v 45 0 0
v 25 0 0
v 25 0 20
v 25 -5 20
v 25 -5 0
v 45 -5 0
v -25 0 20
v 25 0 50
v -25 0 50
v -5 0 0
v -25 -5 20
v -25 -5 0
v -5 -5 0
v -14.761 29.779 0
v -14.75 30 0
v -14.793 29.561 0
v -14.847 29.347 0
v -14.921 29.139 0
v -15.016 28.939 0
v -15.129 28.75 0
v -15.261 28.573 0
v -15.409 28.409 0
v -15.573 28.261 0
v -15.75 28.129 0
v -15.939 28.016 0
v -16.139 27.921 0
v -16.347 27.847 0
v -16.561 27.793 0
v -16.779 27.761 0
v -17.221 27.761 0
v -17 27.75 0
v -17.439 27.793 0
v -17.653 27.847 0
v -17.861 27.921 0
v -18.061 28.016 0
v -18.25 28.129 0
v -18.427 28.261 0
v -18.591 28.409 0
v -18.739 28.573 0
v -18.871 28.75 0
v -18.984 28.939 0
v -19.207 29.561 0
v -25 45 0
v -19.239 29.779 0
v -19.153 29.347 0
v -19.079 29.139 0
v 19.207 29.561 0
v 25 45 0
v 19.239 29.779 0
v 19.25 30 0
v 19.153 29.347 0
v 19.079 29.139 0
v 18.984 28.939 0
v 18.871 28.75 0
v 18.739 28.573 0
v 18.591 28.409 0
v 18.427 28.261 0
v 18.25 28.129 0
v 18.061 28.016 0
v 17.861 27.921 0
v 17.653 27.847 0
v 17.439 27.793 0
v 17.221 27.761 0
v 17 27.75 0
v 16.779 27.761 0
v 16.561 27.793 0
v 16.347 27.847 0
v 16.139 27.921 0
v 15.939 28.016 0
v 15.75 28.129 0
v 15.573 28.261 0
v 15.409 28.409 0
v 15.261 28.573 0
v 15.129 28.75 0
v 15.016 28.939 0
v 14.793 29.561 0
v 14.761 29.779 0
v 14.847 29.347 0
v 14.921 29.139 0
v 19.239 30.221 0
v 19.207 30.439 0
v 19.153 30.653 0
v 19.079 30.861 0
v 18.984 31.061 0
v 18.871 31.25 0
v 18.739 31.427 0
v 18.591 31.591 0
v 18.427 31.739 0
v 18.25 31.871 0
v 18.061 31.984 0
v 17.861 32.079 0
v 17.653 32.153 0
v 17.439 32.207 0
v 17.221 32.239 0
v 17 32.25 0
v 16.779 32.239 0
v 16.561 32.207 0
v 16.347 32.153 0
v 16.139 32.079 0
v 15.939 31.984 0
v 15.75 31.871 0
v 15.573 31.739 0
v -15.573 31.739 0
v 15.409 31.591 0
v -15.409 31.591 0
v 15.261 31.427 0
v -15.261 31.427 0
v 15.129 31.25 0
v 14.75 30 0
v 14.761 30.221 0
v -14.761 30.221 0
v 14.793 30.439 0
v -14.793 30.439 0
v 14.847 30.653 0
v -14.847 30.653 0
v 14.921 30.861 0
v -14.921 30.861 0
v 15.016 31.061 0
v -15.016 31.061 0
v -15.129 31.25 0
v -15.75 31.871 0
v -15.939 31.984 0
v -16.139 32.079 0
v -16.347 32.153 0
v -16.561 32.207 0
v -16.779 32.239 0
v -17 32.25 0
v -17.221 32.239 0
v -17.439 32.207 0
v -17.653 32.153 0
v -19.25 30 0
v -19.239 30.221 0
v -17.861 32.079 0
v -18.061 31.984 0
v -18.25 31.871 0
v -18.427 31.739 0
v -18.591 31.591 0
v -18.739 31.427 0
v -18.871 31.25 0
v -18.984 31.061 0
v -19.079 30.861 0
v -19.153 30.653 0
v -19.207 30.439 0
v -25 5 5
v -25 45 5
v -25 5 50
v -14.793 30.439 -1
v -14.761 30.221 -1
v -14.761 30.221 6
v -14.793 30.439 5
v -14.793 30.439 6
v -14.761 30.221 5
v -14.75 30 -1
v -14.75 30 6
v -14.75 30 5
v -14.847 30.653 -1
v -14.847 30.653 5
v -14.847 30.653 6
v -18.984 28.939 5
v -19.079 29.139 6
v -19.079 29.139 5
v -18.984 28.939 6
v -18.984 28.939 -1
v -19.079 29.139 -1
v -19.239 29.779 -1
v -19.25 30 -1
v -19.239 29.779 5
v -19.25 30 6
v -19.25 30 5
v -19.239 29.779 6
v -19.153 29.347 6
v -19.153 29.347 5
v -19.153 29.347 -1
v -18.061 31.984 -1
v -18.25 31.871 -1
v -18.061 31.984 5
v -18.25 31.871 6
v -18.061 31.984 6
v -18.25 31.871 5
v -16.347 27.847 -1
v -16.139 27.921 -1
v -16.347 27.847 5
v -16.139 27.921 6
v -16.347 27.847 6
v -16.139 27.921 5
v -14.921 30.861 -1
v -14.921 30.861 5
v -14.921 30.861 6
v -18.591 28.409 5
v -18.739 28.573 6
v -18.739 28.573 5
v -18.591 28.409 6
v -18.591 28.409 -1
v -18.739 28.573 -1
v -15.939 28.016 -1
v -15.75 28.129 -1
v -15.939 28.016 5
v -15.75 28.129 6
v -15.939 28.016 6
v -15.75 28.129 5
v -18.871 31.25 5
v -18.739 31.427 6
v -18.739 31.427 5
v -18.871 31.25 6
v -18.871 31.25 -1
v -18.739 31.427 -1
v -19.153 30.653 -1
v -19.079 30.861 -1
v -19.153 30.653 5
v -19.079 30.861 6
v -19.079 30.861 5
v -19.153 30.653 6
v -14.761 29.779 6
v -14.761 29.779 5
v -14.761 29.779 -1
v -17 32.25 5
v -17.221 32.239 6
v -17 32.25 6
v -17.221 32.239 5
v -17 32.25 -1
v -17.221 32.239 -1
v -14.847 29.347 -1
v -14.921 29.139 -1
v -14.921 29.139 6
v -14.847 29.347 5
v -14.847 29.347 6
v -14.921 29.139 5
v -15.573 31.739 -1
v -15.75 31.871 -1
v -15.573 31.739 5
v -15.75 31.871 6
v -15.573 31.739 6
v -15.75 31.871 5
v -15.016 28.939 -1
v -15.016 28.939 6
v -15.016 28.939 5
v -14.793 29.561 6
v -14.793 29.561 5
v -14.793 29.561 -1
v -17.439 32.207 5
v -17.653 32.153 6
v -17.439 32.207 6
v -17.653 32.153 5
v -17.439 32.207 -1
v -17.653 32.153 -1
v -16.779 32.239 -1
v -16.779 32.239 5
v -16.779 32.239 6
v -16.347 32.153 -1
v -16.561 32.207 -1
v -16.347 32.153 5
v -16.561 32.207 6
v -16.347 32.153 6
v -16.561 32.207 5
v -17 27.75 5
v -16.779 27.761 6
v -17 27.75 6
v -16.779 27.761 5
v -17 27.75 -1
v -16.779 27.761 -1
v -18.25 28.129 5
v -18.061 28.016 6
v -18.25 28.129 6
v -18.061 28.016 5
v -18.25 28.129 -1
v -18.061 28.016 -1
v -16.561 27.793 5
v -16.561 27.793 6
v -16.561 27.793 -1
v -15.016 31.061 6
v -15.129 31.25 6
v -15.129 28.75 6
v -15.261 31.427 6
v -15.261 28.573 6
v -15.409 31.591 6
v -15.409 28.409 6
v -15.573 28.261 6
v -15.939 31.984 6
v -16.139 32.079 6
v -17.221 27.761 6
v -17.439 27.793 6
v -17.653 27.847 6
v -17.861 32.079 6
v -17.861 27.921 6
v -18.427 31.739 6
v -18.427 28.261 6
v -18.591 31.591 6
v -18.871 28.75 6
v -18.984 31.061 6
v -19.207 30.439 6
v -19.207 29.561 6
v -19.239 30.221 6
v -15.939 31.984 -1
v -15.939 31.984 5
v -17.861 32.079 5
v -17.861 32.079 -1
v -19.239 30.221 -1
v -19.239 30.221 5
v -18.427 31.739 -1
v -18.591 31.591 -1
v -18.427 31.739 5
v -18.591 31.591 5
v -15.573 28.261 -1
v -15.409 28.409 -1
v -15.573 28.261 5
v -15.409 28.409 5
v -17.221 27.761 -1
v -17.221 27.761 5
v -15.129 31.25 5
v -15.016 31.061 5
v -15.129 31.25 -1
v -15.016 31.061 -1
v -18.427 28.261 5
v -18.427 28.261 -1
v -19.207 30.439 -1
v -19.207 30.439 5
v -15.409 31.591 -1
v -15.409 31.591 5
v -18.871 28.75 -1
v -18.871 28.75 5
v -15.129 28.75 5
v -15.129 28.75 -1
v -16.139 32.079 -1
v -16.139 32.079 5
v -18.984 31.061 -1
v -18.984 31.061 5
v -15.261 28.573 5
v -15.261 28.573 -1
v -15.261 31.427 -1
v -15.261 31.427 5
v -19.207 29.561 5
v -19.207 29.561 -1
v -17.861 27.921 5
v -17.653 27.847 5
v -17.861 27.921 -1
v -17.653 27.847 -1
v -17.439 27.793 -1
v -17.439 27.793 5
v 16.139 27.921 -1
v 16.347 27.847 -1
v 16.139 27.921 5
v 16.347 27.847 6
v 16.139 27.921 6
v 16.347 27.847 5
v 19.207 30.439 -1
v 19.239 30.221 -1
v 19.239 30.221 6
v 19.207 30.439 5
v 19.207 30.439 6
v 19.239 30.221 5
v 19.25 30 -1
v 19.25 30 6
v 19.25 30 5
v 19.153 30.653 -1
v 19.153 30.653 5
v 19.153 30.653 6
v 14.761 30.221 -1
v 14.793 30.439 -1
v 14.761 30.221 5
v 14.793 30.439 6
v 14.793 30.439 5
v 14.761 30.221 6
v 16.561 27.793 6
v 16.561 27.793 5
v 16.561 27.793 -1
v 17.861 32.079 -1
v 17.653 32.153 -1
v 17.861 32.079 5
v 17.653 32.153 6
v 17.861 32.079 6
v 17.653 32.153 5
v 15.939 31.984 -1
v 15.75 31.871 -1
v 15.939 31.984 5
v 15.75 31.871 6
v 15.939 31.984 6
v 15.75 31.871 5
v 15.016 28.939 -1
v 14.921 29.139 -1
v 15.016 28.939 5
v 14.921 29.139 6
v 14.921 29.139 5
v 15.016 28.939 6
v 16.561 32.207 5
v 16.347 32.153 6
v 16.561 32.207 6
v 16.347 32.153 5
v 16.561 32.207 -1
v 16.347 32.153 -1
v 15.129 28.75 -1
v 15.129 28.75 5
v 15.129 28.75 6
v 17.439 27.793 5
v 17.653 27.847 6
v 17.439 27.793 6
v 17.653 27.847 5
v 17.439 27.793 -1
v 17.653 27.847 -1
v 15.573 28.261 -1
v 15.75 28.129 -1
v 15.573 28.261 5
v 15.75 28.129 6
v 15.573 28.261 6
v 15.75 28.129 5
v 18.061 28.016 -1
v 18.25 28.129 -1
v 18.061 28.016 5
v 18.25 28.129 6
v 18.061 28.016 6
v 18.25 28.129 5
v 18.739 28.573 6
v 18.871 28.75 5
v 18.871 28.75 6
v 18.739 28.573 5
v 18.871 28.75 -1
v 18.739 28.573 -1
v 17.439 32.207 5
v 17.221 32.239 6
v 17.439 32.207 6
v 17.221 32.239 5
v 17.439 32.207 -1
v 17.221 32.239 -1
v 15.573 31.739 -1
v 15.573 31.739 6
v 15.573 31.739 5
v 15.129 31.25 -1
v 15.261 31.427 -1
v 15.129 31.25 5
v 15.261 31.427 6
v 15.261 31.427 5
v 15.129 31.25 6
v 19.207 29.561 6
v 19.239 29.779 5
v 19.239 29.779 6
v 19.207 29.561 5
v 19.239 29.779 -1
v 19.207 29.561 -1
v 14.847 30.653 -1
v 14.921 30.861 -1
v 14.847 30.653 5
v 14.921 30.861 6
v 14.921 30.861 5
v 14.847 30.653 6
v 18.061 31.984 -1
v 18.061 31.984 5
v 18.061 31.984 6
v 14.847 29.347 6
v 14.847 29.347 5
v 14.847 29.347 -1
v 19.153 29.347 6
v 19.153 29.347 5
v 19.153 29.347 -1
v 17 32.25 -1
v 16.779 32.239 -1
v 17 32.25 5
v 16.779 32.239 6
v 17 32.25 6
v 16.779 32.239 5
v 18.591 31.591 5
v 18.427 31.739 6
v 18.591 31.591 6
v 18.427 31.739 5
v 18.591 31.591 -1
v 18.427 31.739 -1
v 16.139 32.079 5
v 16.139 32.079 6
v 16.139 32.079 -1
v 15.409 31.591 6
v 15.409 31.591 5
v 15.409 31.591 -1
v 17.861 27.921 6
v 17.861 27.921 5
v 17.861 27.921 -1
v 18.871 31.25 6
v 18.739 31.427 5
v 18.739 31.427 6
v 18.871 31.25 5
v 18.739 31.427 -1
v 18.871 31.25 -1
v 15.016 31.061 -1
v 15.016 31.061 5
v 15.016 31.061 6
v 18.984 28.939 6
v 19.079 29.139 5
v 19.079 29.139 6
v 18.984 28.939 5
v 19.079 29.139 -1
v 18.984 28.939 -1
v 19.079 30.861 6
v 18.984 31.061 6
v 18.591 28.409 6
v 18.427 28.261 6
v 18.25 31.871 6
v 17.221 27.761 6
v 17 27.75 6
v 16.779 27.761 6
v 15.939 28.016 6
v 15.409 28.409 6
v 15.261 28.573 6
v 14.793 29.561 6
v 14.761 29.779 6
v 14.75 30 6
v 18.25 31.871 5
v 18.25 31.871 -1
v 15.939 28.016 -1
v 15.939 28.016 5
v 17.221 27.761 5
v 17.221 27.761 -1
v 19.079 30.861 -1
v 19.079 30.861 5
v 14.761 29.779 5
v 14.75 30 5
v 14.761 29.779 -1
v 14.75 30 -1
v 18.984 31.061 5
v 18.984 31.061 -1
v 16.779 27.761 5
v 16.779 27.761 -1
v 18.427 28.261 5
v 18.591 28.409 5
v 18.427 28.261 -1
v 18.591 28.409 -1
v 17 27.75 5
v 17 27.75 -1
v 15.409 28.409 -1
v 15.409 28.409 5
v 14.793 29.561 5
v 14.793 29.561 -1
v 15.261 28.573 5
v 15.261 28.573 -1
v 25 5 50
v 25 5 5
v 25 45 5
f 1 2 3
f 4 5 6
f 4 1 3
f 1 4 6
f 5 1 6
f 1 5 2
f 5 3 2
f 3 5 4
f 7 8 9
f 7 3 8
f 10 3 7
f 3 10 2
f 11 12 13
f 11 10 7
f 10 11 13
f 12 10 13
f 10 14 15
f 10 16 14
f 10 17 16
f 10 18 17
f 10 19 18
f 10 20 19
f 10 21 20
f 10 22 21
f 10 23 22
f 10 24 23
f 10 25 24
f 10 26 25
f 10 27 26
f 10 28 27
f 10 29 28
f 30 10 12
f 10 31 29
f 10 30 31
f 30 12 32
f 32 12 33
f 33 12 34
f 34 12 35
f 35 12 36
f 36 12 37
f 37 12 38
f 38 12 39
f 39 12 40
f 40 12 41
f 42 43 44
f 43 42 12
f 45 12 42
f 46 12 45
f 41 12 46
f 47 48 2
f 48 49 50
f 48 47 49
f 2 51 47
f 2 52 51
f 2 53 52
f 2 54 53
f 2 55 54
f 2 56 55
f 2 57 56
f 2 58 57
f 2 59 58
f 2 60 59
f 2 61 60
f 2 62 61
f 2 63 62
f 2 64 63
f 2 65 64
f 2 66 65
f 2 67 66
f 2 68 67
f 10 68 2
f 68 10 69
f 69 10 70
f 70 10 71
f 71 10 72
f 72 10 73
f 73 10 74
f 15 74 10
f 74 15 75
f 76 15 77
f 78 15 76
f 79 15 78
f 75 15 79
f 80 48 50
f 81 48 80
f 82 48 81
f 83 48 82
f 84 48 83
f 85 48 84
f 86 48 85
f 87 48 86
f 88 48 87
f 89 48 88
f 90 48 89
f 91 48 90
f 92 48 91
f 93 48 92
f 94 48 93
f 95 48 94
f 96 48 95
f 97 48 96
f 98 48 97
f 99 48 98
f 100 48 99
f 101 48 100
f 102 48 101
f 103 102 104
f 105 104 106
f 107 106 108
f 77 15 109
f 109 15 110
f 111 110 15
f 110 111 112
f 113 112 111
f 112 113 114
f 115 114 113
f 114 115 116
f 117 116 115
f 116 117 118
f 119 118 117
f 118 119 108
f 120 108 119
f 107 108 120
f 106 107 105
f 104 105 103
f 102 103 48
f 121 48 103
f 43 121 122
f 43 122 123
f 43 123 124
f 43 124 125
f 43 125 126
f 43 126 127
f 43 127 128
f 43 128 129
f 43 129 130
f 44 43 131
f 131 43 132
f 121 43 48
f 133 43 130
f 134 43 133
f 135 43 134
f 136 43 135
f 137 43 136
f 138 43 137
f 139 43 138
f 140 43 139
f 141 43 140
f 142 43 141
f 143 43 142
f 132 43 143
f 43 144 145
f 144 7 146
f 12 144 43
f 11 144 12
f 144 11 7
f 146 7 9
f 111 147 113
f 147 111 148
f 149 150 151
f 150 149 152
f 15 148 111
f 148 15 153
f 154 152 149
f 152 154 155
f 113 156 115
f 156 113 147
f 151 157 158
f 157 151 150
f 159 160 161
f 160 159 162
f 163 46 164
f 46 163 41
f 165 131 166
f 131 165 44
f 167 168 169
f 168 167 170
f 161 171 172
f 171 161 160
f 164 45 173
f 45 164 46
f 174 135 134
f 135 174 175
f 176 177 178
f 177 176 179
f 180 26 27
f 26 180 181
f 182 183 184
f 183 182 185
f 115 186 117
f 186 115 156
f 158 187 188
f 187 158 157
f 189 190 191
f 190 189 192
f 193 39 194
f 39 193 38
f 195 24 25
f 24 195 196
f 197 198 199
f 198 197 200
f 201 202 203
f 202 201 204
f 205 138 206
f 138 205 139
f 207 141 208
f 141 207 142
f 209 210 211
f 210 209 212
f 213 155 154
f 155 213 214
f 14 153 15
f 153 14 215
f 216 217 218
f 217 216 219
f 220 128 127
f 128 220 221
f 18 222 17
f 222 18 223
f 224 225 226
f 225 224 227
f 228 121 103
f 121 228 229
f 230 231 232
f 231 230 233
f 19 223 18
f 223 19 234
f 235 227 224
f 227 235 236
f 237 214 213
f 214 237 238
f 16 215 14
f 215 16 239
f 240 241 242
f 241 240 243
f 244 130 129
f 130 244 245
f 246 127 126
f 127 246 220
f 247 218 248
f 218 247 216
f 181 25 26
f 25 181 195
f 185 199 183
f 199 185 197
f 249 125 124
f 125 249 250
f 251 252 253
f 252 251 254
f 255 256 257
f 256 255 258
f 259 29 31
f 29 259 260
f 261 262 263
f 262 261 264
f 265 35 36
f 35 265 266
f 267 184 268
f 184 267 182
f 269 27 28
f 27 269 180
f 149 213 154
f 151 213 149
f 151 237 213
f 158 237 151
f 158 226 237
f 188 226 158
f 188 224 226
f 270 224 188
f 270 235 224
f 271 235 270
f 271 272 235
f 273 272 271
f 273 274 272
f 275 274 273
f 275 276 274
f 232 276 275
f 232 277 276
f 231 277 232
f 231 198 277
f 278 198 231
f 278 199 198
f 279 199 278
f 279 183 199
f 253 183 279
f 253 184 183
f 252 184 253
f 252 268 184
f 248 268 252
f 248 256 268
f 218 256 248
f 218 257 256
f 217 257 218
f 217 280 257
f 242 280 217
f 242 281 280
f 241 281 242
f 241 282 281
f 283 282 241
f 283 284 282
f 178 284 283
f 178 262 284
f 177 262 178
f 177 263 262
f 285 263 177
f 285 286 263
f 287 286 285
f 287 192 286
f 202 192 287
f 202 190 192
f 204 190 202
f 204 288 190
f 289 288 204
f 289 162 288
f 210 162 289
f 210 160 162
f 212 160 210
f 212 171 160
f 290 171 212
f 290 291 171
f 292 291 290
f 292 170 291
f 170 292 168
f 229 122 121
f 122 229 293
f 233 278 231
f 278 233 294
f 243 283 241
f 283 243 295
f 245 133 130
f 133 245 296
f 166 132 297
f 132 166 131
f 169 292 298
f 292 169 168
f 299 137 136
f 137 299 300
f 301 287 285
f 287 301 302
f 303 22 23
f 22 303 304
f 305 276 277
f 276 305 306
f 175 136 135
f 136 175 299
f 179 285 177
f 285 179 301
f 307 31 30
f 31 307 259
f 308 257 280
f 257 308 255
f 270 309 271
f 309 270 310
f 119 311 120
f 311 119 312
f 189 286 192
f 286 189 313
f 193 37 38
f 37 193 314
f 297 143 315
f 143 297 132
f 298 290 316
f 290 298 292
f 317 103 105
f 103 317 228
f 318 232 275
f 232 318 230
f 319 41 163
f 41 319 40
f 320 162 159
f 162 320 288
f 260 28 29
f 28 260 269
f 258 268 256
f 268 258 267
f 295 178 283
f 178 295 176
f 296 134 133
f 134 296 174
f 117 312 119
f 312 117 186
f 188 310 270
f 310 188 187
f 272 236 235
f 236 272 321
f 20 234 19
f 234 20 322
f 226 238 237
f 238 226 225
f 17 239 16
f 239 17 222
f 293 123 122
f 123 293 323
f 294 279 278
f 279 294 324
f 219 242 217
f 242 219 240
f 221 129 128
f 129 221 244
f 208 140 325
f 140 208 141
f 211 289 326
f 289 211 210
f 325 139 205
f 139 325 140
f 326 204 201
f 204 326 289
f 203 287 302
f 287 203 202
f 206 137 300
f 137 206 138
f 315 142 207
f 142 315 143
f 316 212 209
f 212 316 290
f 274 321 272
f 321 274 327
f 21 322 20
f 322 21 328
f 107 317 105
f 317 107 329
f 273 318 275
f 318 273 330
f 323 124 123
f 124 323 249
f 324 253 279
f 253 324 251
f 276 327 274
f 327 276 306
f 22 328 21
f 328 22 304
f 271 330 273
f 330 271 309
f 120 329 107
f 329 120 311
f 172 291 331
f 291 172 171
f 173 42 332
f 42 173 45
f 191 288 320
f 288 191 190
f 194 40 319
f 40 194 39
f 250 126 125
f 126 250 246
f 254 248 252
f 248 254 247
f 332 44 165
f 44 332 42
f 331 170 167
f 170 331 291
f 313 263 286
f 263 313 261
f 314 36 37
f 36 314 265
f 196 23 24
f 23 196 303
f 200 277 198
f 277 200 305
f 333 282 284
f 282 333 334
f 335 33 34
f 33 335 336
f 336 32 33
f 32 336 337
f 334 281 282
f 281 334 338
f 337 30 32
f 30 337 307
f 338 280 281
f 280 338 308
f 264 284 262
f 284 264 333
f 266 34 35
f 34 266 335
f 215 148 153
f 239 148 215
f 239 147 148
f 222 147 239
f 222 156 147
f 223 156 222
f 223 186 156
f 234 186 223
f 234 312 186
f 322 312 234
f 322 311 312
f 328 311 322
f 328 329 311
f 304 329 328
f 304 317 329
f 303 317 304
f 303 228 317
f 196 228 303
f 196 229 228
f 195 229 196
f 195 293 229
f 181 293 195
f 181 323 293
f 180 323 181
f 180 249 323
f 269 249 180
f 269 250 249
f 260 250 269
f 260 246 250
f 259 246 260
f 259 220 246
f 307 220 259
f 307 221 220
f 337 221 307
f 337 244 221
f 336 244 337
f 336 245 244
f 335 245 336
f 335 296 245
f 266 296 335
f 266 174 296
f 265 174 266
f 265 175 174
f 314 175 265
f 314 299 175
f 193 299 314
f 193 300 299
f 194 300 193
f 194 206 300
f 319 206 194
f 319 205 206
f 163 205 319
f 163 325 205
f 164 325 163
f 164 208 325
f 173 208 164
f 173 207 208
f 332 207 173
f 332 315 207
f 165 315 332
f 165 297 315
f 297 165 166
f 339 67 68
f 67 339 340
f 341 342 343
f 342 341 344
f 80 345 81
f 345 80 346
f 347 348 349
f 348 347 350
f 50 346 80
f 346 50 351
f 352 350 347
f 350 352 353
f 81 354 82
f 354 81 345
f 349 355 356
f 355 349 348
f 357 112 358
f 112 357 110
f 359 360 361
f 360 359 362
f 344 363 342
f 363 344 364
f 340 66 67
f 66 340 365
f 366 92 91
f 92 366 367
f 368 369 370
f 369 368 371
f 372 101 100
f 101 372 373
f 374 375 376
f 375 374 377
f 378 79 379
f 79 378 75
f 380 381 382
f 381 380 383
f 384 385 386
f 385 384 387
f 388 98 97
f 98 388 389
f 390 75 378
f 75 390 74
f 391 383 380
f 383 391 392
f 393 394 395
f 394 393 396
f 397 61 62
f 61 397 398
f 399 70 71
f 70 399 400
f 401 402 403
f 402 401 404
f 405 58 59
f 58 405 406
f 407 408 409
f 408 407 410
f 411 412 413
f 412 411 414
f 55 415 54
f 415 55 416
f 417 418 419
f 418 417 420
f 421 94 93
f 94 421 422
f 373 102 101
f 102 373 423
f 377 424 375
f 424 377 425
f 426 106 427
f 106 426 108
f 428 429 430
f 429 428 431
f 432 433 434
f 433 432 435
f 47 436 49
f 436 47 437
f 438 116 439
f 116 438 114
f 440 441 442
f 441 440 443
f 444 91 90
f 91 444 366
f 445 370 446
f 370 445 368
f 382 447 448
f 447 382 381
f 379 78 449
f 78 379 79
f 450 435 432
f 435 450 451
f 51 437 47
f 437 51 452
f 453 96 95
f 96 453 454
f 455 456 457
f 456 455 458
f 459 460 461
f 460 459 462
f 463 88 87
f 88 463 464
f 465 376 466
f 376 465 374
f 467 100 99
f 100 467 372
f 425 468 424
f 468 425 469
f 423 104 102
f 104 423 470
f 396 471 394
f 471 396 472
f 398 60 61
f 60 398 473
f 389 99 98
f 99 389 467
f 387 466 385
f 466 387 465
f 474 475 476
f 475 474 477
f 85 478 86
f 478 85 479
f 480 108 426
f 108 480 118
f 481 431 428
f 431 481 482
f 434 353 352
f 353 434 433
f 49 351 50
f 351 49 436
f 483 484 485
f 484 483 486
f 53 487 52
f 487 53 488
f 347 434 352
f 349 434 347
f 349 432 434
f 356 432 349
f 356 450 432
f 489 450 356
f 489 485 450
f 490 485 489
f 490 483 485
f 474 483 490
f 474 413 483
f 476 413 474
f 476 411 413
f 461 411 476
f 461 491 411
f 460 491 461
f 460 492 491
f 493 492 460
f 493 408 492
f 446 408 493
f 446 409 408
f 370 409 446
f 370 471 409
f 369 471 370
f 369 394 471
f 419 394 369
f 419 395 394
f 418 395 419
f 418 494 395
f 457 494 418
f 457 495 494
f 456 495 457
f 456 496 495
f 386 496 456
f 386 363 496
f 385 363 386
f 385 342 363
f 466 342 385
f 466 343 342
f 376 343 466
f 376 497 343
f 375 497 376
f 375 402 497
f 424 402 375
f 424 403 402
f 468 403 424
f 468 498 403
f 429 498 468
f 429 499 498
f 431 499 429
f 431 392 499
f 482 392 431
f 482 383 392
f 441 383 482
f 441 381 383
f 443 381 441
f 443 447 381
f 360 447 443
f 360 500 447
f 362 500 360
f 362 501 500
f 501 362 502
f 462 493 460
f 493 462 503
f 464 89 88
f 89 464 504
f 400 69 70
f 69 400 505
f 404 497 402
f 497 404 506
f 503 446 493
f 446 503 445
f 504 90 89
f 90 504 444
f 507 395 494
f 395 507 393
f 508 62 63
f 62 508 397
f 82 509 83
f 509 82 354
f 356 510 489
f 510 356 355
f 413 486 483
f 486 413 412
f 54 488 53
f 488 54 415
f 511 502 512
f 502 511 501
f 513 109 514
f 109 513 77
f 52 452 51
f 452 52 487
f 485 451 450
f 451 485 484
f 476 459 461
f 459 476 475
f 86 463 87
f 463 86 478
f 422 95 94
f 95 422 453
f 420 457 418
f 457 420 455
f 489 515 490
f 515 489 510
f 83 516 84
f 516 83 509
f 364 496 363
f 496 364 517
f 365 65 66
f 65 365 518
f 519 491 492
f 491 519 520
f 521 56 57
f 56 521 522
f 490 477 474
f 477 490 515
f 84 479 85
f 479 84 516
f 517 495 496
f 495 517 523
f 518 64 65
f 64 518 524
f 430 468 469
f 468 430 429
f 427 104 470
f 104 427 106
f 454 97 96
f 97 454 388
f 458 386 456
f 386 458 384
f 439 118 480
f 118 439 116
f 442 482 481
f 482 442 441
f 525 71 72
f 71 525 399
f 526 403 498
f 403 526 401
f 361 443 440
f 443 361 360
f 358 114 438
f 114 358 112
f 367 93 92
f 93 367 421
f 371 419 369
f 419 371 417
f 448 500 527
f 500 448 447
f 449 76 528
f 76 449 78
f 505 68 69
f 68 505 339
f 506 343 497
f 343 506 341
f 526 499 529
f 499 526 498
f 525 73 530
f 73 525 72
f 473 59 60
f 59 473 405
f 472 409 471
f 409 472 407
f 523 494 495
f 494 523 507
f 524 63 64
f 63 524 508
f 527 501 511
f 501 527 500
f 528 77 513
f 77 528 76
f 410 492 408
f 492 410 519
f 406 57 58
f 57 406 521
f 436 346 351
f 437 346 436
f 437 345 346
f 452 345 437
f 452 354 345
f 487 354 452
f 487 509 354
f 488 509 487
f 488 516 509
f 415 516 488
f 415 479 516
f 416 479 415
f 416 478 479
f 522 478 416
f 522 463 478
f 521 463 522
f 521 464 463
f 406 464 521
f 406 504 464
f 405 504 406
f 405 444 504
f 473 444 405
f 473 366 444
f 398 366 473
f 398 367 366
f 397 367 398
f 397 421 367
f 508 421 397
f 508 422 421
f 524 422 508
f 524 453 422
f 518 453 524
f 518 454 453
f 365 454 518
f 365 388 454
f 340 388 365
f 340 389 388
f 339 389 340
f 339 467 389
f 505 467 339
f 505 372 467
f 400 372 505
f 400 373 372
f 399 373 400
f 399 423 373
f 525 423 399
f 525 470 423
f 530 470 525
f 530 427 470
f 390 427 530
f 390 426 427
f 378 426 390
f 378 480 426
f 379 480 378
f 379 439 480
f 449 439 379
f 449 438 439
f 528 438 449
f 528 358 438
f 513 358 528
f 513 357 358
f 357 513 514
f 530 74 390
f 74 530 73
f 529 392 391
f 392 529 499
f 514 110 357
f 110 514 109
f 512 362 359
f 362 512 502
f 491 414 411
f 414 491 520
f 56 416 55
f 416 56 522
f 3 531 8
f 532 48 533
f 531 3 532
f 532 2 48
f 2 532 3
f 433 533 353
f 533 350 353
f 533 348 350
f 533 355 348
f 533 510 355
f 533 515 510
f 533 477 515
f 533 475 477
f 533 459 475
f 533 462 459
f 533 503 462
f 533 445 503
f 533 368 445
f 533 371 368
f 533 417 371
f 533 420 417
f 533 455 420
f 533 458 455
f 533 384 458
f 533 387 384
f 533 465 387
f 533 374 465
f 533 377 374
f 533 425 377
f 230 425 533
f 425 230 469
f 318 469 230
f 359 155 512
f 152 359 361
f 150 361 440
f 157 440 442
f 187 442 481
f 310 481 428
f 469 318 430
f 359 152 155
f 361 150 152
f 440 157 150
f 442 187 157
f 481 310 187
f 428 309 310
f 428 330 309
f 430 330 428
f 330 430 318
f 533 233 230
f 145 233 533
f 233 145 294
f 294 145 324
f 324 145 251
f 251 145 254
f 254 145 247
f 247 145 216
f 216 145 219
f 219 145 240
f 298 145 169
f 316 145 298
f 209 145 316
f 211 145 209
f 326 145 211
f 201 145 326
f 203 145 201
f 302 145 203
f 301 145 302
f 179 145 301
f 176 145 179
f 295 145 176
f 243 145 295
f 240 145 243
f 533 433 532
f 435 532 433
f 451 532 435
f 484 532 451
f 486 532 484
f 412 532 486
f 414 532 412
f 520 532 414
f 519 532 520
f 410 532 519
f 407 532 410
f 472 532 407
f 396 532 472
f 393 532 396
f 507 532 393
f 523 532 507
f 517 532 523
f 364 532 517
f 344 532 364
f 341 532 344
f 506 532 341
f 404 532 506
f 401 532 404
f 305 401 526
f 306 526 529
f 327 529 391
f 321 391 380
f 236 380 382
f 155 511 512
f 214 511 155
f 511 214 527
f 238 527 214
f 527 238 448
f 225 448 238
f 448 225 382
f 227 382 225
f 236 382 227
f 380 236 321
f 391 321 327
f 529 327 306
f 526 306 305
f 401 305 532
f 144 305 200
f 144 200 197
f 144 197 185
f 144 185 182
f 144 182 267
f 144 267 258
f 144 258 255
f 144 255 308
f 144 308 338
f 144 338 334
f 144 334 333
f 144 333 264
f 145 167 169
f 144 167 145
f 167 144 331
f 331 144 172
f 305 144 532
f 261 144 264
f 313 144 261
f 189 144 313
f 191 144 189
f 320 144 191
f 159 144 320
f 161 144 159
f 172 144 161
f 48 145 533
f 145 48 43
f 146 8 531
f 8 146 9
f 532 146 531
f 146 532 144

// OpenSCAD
// L-shaped mounting bracket for a NEMA 17 stepper motor
// Print orientation: base plate on the bed (z = 0), motor plate builds upward (+Z)

$fn = 64;

// ---------------- Dimensions (mm) ----------------
// Base plate
base_x0 = -25;   // base plate, x start
base_x1 = 25;    // base plate, x end
base_y0 = 0;     // base plate, y start
base_y1 = 45;    // base plate, y end
base_z1 = 5;     // base plate, z end (thickness)

// Motor plate
motor_x0 = -25;  // motor plate, x start
motor_x1 = 25;   // motor plate, x end
motor_y0 = 0;    // motor plate, y start
motor_y1 = 5;    // motor plate, y end (thickness)
motor_z1 = 50;   // motor plate, z end (height)

// Through-holes
m4_d     = 4.5;  // M4 vertical through-hole diameter (base plate)
m4_x     = 17;   // M4 hole centre, x (holes at x = -17 and x = +17)
m4_y     = 30;   // M4 hole centre, y
m3_d     = 3.4;  // M3 screw hole diameter (motor plate)
m3_a     = 31;   // M3 hole pattern: square side length
m3_z     = 28;   // M3 holes centre height, z (with boss hole)

// Boss hole (motor centring)
boss_d   = 23;   // boss hole diameter
boss_x   = 0;    // boss hole centre, x

// Gussets
gusset_t = 5;    // gusset thickness (X)
gusset_l = 20;   // gusset leg length (Y and Z)
gusset_x0 = -25; // left gusset, x start
gusset_x1 = 20;  // right gusset, x end (x = 20 to 25)

// ---------------- Model ----------------
union() {
    // Base plate
    translate([base_x0, base_y0, 0])
        cube([base_x1 - base_x0, base_y1 - base_y0, base_z1]);

    // Vertical motor plate
    translate([motor_x0, motor_y0, 0])
        cube([motor_x1 - motor_x0, motor_y1 - motor_y0, motor_z1]);

    // Triangular gussets (right triangle in YZ, flush with left/right edges)
    for (sx = [-1, 1])
        translate([sx * gusset_x0, 0, 0])
            rotate([90, 0, 0])
                linear_extrude(height = gusset_t)
                    polygon(points = [
                        [0, 0],
                        [gusset_l, 0],
                        [0, gusset_l]
                    ]);

    // Through-holes
    difference() {
        // M4 vertical through-holes in base plate
        for (sx = [-1, 1])
            translate([sx * m4_x, m4_y, -1])
                cylinder(d = m4_d, h = base_z1 + 2);

        // Boss hole along Y, centred at (boss_x, 0, m3_z)
        translate([boss_x, 0, m3_z])
            rotate([90, 0, 0])
                cylinder(d = boss_d, h = motor_y1 + 2);

        // M3 screw holes on a square pattern, centred on the boss hole
        for (a = [0, 90, 180, 270])
            rotate([0, 0, a])
                translate([m3_a / 2, 0, -1])
                    cylinder(d = m3_d, h = motor_z1 + 2);
    }
}
